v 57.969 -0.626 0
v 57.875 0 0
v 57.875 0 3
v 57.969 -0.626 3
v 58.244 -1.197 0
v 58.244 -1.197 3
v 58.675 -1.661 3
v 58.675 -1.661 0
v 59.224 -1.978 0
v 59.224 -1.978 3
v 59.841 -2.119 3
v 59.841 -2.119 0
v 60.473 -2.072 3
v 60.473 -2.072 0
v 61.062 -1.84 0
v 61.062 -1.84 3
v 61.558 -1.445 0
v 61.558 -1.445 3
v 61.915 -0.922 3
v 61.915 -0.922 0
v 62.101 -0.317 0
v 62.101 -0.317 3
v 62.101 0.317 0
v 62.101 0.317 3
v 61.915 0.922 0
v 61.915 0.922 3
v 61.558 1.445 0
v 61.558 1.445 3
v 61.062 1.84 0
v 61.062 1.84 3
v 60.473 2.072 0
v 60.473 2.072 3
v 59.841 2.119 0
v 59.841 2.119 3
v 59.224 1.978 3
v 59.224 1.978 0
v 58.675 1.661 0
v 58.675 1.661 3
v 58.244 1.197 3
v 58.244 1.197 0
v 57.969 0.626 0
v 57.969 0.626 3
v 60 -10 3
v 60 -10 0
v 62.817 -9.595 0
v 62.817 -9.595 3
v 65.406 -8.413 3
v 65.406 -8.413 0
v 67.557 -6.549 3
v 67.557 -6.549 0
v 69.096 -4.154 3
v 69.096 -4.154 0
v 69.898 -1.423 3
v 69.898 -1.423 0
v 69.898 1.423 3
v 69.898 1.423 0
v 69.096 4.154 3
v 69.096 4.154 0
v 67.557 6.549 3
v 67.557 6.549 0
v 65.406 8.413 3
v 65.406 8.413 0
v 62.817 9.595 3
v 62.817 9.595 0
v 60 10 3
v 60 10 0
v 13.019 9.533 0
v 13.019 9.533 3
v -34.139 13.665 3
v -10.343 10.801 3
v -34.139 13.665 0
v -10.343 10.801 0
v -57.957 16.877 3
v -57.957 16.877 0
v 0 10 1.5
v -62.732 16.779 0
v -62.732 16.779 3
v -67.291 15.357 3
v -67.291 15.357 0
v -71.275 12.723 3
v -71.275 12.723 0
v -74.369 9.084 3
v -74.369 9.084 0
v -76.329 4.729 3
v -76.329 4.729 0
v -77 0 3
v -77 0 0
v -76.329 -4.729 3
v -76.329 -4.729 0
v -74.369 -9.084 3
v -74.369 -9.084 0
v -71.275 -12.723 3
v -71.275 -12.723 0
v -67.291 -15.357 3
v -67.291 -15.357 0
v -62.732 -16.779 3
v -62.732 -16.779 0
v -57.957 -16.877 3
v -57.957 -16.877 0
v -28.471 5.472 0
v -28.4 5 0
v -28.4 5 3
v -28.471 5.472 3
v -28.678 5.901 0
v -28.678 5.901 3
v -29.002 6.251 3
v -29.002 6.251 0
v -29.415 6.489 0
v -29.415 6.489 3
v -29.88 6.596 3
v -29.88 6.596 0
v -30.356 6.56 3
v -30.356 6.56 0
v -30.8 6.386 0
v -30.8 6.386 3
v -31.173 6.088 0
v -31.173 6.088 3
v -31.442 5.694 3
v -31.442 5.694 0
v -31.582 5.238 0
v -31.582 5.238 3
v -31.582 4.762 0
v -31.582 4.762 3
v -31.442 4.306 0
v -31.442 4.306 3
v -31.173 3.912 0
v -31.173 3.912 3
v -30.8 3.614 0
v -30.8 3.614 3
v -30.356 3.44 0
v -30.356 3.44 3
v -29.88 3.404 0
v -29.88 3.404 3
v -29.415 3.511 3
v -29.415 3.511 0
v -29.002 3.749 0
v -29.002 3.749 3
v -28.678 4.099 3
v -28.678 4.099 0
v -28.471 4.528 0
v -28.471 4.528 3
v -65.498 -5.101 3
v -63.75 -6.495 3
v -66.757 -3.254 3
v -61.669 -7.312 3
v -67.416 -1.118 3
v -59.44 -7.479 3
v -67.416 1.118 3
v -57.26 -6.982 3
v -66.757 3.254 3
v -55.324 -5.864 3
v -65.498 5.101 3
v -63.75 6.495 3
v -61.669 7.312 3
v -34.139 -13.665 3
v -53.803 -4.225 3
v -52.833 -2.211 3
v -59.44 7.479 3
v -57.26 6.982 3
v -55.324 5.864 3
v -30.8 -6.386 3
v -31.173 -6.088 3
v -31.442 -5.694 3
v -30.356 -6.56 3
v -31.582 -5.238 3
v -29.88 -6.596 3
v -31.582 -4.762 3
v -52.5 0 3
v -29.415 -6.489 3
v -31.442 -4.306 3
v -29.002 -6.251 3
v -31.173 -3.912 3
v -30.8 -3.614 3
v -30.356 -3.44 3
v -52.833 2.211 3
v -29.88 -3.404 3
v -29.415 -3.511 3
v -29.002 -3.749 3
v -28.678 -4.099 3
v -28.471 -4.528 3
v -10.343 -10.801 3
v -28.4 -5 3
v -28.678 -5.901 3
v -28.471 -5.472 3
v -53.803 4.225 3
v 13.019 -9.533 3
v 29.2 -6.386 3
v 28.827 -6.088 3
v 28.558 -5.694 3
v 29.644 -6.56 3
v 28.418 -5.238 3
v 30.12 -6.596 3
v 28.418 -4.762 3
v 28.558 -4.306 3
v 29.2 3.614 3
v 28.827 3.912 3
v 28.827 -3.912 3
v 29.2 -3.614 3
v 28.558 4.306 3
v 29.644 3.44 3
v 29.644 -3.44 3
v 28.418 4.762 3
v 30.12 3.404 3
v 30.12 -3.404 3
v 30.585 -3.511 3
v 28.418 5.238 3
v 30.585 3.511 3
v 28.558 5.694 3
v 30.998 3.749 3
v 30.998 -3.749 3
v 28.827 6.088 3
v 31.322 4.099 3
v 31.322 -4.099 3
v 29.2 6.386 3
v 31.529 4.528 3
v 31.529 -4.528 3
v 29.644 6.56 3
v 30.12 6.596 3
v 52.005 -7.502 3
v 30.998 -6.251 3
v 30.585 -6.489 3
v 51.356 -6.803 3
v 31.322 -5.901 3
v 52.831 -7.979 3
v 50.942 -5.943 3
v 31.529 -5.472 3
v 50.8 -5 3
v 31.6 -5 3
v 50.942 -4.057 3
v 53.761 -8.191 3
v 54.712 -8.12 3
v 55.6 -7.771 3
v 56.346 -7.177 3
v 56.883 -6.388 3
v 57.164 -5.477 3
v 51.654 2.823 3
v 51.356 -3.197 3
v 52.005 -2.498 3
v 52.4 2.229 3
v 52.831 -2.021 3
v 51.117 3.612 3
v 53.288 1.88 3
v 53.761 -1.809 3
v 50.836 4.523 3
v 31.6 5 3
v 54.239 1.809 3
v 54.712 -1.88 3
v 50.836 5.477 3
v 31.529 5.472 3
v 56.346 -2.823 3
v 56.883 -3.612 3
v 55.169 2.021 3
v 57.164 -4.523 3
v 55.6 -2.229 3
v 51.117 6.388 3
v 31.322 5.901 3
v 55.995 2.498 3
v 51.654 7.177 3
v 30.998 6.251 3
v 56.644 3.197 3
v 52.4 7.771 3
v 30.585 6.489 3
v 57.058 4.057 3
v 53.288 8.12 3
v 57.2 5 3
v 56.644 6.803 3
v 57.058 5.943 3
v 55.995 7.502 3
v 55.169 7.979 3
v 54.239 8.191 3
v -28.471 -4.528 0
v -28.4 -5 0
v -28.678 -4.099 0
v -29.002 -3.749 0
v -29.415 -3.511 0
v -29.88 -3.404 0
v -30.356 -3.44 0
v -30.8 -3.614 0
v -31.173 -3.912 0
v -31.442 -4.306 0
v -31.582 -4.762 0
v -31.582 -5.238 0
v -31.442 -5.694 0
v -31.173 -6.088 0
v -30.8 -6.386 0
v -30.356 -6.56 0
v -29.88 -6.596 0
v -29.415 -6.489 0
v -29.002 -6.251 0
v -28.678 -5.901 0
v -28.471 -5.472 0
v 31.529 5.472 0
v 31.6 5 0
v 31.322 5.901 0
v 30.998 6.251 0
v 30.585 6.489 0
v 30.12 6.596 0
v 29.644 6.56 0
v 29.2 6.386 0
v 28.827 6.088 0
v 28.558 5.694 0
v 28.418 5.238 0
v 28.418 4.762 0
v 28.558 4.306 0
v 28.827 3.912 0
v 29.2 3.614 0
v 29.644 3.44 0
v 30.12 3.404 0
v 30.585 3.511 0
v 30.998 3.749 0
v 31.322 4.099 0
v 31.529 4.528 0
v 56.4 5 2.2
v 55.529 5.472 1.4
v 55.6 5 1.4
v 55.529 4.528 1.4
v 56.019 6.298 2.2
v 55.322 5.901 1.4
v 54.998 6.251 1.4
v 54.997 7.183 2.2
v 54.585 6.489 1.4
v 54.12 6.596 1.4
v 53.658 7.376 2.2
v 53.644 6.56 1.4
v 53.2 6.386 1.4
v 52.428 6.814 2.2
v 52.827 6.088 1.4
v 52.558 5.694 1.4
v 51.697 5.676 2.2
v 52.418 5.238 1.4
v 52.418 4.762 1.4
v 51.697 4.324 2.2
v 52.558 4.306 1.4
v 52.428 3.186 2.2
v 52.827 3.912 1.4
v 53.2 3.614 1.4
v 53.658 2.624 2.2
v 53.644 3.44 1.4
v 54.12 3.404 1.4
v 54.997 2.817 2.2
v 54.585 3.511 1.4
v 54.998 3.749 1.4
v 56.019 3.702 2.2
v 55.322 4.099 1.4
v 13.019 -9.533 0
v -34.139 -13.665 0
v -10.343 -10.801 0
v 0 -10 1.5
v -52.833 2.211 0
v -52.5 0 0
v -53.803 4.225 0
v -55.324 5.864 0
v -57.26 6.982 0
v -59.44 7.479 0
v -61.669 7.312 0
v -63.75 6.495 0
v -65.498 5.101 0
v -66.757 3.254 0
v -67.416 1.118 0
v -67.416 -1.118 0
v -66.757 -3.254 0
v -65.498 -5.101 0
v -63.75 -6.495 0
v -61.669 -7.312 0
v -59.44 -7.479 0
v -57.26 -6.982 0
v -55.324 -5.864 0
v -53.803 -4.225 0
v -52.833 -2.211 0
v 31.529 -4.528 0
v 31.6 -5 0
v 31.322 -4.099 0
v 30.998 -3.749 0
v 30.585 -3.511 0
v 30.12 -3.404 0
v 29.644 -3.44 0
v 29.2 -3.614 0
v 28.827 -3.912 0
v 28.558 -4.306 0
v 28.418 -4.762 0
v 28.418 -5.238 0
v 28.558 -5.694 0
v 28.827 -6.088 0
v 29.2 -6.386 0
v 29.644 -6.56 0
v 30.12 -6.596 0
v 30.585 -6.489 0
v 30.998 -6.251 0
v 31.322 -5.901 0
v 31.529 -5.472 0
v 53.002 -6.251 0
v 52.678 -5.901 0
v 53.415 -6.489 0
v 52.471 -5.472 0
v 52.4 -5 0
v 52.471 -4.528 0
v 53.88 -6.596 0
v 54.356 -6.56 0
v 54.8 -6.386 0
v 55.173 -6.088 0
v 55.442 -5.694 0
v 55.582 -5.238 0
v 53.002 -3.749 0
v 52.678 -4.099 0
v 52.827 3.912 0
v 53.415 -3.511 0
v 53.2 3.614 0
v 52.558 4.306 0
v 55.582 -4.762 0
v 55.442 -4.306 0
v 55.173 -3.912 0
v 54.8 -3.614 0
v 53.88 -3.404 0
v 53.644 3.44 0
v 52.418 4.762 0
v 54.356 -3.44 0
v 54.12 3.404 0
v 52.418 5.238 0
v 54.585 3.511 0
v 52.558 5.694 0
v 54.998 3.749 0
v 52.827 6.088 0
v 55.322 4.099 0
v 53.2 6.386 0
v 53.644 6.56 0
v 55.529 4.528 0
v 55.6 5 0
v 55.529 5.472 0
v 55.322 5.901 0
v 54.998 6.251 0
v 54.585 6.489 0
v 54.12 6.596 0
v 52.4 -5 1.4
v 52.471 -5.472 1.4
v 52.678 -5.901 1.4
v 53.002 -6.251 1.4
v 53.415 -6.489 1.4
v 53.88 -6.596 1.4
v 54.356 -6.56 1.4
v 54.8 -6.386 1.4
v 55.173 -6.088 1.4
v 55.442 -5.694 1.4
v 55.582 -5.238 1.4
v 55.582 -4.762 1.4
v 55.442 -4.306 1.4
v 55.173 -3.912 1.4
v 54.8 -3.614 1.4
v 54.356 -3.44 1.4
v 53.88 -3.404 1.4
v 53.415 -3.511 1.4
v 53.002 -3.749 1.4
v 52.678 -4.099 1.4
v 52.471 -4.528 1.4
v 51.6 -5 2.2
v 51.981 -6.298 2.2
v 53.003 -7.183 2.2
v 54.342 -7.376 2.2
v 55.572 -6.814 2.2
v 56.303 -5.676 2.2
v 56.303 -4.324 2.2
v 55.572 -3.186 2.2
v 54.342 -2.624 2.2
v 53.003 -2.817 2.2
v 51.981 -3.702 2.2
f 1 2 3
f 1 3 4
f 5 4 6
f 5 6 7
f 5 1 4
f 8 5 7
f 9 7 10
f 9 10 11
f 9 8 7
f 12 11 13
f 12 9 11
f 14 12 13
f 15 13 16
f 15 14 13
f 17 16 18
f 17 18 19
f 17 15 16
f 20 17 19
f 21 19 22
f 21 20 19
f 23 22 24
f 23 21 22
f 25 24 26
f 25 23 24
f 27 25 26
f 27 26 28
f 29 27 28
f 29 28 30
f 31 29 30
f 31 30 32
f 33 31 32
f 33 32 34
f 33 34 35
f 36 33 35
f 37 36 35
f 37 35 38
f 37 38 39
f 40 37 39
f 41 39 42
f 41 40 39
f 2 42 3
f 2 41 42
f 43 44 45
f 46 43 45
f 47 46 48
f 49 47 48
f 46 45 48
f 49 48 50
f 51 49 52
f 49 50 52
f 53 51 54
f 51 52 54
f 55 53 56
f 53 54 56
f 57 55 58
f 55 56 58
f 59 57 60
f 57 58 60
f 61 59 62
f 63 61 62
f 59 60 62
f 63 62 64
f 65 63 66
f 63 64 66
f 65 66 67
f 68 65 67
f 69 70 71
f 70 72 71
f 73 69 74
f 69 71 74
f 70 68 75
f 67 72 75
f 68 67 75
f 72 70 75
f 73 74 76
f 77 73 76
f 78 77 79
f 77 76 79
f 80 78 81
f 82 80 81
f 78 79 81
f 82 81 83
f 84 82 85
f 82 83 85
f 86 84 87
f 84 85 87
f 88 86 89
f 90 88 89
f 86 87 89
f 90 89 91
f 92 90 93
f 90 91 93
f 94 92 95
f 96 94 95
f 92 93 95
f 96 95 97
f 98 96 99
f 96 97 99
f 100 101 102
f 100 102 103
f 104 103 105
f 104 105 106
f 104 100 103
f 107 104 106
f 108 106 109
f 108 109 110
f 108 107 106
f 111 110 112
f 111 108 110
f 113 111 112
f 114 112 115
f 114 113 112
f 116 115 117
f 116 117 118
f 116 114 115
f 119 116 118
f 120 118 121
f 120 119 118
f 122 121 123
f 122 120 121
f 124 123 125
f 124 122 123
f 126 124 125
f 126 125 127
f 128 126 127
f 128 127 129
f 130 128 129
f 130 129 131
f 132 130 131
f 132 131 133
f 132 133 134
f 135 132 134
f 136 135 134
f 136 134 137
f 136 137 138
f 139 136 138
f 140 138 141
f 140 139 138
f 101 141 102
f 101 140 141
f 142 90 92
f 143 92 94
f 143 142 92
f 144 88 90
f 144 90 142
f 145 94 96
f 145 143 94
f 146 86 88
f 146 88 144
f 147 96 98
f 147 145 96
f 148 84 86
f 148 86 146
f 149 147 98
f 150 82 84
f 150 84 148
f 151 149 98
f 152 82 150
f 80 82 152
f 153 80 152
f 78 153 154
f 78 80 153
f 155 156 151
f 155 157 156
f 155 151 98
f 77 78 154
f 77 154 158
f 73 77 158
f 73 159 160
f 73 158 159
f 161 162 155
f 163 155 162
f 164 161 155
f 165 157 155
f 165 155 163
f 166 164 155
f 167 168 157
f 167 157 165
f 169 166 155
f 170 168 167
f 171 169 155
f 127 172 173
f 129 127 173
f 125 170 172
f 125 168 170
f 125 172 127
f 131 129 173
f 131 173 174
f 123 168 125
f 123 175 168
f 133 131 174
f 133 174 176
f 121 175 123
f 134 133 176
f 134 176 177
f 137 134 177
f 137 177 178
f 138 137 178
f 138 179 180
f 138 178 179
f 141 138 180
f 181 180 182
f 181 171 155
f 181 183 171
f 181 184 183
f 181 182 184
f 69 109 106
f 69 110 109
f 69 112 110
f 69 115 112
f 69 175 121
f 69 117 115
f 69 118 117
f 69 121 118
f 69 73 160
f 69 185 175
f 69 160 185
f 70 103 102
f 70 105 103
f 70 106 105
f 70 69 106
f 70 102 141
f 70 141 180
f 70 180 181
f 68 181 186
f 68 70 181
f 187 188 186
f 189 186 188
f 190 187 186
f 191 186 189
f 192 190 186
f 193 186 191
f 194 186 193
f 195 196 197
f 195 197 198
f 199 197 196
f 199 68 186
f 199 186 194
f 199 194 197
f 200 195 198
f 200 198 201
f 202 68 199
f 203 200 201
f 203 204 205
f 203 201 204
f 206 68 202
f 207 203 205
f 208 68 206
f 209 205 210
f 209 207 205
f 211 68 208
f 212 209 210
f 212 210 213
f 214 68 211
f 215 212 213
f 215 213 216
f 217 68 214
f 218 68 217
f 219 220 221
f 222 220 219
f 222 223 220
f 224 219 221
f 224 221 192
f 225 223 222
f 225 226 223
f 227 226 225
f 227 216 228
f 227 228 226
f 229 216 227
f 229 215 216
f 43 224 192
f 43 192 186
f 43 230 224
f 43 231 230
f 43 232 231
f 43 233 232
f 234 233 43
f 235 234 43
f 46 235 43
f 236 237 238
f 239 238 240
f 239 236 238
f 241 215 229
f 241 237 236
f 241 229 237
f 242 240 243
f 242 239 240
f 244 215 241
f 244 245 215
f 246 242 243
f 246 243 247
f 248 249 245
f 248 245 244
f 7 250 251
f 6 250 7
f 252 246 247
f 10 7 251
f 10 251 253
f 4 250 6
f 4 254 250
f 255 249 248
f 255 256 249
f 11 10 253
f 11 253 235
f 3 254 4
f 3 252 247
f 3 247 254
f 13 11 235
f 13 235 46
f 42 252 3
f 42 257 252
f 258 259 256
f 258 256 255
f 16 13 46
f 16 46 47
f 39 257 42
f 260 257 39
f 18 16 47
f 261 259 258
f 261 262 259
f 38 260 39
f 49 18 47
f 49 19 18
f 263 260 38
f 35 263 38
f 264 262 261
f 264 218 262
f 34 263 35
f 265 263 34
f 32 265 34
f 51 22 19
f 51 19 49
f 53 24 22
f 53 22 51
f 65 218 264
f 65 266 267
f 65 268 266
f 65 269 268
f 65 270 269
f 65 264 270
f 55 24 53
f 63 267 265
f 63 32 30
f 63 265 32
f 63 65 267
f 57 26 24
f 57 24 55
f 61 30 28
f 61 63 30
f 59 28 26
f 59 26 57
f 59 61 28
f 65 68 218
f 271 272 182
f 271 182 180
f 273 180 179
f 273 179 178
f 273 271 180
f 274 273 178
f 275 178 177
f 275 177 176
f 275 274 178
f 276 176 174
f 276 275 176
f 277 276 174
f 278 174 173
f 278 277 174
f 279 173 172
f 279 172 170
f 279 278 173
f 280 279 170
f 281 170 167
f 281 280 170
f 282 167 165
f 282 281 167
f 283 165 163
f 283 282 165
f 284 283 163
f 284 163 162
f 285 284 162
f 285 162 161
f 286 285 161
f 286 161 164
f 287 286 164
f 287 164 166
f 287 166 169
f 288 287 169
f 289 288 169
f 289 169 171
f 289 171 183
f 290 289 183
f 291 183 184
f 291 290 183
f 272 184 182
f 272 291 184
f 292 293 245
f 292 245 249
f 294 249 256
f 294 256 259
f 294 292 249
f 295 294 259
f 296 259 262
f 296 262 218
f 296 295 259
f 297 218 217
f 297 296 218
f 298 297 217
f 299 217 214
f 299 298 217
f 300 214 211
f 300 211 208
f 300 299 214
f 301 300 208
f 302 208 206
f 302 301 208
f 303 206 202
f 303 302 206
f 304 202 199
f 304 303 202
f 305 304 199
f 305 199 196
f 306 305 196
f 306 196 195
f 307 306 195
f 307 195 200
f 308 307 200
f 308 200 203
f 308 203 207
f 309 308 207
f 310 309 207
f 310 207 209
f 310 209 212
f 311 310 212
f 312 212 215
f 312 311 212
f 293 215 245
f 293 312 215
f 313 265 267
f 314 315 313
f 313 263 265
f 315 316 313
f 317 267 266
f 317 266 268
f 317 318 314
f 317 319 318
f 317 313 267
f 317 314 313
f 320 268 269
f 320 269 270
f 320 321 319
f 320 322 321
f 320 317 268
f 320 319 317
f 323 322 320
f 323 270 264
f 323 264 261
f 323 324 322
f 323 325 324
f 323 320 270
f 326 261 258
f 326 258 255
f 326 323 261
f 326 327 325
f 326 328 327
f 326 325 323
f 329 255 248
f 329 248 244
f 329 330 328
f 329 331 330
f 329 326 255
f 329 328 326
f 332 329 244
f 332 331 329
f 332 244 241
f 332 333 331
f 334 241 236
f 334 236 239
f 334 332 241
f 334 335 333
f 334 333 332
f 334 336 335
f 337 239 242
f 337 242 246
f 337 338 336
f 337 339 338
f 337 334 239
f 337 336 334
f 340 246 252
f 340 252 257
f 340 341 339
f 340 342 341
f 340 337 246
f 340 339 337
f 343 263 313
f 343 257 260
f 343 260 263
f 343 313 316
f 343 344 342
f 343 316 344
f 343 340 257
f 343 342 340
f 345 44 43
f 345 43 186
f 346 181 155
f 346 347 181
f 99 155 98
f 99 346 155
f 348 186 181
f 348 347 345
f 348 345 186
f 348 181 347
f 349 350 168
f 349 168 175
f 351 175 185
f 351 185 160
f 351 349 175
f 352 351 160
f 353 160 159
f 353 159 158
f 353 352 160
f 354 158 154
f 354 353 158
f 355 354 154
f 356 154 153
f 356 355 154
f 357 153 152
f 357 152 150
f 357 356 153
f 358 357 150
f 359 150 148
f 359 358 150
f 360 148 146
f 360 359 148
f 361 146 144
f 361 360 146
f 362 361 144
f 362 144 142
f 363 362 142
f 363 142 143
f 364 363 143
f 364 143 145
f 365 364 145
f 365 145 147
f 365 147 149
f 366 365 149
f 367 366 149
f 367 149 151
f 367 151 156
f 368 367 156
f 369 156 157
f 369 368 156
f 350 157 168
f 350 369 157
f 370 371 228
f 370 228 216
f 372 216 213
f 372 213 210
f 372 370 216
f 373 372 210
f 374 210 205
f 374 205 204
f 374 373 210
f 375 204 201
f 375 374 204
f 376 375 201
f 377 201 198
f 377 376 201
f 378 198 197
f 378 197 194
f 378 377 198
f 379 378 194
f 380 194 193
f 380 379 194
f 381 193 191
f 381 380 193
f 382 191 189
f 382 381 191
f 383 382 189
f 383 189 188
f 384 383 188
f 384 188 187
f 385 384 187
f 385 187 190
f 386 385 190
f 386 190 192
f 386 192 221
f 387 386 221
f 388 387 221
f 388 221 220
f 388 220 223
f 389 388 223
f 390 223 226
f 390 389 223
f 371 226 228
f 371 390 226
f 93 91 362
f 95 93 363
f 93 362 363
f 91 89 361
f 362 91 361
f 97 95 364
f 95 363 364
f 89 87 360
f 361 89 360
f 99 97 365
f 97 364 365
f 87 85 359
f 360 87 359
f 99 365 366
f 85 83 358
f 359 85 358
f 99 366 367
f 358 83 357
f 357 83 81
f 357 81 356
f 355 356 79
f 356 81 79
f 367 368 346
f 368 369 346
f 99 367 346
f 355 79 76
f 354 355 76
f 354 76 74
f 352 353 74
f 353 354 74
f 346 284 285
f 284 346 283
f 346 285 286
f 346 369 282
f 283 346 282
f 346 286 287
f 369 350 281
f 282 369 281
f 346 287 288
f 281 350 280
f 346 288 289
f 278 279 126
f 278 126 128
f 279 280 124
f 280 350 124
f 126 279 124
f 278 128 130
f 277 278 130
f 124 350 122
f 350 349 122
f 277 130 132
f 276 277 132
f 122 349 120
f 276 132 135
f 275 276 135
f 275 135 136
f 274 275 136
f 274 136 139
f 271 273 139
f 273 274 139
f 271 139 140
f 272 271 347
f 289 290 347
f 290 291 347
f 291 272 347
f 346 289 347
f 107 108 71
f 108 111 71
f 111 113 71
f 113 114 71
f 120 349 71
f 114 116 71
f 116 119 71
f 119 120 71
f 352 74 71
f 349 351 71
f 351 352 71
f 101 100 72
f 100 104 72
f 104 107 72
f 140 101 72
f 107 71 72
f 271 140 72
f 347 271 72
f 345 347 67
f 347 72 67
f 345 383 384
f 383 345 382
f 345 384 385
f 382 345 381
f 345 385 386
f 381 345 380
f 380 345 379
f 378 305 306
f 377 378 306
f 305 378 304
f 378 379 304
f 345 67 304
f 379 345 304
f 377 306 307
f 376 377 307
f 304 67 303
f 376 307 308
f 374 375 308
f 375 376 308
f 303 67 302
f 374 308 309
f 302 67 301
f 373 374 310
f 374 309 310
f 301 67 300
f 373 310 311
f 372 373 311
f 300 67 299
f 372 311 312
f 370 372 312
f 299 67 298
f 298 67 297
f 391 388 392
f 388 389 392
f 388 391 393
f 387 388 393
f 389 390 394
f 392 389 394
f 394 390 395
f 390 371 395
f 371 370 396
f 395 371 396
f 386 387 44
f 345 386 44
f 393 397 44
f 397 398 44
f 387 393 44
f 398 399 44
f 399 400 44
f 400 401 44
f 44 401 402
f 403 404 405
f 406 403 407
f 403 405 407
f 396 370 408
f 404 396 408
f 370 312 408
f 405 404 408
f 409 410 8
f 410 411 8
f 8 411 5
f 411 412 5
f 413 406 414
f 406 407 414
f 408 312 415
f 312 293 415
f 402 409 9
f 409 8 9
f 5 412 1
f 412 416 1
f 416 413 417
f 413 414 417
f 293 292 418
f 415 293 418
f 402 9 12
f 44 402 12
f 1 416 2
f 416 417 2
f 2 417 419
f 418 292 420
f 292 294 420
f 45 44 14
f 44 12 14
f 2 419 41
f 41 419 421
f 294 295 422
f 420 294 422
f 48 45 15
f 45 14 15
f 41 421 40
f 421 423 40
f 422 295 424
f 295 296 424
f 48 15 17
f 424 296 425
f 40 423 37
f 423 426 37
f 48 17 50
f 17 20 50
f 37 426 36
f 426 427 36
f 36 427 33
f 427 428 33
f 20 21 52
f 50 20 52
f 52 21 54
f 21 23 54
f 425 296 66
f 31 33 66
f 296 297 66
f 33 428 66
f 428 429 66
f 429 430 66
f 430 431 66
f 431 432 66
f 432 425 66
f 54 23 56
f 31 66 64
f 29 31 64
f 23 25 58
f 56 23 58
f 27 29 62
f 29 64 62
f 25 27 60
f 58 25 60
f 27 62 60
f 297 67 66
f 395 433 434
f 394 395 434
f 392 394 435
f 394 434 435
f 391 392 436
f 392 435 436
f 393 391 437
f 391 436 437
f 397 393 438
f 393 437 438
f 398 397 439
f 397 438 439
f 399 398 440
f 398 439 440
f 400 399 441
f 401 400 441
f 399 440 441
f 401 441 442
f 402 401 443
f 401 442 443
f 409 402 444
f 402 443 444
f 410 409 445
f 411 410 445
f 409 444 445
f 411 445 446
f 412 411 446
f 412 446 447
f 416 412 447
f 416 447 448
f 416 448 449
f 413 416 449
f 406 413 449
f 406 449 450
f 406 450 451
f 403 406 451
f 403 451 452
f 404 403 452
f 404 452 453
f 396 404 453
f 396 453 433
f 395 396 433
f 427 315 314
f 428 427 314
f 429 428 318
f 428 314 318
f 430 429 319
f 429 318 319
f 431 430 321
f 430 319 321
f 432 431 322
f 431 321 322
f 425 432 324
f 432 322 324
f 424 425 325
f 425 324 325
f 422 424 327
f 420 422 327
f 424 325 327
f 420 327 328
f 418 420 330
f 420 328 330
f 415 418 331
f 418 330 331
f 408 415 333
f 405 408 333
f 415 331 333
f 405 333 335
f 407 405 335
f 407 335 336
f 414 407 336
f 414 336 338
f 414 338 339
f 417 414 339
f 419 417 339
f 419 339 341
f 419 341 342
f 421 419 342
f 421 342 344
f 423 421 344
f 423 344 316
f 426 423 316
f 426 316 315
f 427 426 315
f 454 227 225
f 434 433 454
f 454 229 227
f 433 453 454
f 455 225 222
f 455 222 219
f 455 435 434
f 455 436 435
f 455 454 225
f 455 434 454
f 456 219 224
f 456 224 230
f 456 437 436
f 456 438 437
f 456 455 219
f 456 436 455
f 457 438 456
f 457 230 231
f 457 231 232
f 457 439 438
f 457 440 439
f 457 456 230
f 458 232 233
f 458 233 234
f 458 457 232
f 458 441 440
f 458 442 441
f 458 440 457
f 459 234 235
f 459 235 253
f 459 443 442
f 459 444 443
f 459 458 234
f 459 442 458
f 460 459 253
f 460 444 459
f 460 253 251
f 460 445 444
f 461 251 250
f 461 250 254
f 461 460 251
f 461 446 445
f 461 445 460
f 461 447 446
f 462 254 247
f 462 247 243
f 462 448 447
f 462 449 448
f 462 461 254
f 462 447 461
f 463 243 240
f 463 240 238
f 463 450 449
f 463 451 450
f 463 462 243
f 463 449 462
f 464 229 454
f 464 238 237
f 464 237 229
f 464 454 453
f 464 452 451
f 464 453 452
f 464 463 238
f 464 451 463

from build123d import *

# Parameters (mm, degrees)
SKETCH1_R           = 7.5
SKETCH1_R_2         = 2.125
SKETCH1_R_3         = 1.6
BOSS_EXTRUDE1_DEPTH = 3
SKETCH2_R           = 1.6
CUT_EXTRUDE1_DEPTH  = 79.91134278
CHAMFER1_SIZE       = 1.6


with BuildPart() as part:
    # Sketch1 → Boss-Extrude1 (new body)
    with BuildSketch(Plane.XY):
        with BuildLine():
            ThreePointArc((-57.956829007, 16.876772567), (-77, 0), (-57.956829007, -16.876772567))
            add(Edge.make_bspline(
                [(60, -10), (39.938279517, -10), (0.415985338, -7.693613776), (-38.598478023, -14.486949791), (-57.956829007, -16.876772567)],
                knots=[0, 0, 0, 0, 0.506913544, 1, 1, 1, 1], degree=3))
            ThreePointArc((60, -10), (70, 0), (60, 10))
            add(Edge.make_bspline(
                [(60, 10), (39.938279517, 10), (0.415985338, 7.693613776), (-38.598478023, 14.486949791), (-57.956829007, 16.876772567)],
                knots=[0, 0, 0, 0, 0.506913544, 1, 1, 1, 1], degree=3))
        make_face()
        with Locations((-60, 0)):
            Circle(SKETCH1_R, mode=Mode.SUBTRACT)
        with Locations(Location((60, 0, 0), (0, 0, 180))):
            Circle(SKETCH1_R_2, mode=Mode.SUBTRACT)
        with Locations((-30, 5)):
            Circle(SKETCH1_R_3, mode=Mode.SUBTRACT)
        with Locations((30, 5)):
            Circle(SKETCH1_R_3, mode=Mode.SUBTRACT)
        with Locations((30, -5)):
            Circle(SKETCH1_R_3, mode=Mode.SUBTRACT)
        with Locations((-30, -5)):
            Circle(SKETCH1_R_3, mode=Mode.SUBTRACT)
    extrude(amount=BOSS_EXTRUDE1_DEPTH)

    # Sketch2 → Cut-Extrude1 (cut, through all)
    with BuildSketch(Plane.XY.offset(3)):
        with Locations((54, 5)):
            Circle(SKETCH2_R)
        with Locations(Location((54, -5, 0), (0, 0, 180))):
            Circle(SKETCH2_R)
    extrude(amount=-CUT_EXTRUDE1_DEPTH, mode=Mode.SUBTRACT)

    # Chamfer1
    chamfer1_edges = [part.edges().sort_by_distance(p)[0] for p in [
        (52.4, 5, 3),
        (55.6, -5, 3),
    ]]
    chamfer(chamfer1_edges, length=CHAMFER1_SIZE)


solid = part.part
